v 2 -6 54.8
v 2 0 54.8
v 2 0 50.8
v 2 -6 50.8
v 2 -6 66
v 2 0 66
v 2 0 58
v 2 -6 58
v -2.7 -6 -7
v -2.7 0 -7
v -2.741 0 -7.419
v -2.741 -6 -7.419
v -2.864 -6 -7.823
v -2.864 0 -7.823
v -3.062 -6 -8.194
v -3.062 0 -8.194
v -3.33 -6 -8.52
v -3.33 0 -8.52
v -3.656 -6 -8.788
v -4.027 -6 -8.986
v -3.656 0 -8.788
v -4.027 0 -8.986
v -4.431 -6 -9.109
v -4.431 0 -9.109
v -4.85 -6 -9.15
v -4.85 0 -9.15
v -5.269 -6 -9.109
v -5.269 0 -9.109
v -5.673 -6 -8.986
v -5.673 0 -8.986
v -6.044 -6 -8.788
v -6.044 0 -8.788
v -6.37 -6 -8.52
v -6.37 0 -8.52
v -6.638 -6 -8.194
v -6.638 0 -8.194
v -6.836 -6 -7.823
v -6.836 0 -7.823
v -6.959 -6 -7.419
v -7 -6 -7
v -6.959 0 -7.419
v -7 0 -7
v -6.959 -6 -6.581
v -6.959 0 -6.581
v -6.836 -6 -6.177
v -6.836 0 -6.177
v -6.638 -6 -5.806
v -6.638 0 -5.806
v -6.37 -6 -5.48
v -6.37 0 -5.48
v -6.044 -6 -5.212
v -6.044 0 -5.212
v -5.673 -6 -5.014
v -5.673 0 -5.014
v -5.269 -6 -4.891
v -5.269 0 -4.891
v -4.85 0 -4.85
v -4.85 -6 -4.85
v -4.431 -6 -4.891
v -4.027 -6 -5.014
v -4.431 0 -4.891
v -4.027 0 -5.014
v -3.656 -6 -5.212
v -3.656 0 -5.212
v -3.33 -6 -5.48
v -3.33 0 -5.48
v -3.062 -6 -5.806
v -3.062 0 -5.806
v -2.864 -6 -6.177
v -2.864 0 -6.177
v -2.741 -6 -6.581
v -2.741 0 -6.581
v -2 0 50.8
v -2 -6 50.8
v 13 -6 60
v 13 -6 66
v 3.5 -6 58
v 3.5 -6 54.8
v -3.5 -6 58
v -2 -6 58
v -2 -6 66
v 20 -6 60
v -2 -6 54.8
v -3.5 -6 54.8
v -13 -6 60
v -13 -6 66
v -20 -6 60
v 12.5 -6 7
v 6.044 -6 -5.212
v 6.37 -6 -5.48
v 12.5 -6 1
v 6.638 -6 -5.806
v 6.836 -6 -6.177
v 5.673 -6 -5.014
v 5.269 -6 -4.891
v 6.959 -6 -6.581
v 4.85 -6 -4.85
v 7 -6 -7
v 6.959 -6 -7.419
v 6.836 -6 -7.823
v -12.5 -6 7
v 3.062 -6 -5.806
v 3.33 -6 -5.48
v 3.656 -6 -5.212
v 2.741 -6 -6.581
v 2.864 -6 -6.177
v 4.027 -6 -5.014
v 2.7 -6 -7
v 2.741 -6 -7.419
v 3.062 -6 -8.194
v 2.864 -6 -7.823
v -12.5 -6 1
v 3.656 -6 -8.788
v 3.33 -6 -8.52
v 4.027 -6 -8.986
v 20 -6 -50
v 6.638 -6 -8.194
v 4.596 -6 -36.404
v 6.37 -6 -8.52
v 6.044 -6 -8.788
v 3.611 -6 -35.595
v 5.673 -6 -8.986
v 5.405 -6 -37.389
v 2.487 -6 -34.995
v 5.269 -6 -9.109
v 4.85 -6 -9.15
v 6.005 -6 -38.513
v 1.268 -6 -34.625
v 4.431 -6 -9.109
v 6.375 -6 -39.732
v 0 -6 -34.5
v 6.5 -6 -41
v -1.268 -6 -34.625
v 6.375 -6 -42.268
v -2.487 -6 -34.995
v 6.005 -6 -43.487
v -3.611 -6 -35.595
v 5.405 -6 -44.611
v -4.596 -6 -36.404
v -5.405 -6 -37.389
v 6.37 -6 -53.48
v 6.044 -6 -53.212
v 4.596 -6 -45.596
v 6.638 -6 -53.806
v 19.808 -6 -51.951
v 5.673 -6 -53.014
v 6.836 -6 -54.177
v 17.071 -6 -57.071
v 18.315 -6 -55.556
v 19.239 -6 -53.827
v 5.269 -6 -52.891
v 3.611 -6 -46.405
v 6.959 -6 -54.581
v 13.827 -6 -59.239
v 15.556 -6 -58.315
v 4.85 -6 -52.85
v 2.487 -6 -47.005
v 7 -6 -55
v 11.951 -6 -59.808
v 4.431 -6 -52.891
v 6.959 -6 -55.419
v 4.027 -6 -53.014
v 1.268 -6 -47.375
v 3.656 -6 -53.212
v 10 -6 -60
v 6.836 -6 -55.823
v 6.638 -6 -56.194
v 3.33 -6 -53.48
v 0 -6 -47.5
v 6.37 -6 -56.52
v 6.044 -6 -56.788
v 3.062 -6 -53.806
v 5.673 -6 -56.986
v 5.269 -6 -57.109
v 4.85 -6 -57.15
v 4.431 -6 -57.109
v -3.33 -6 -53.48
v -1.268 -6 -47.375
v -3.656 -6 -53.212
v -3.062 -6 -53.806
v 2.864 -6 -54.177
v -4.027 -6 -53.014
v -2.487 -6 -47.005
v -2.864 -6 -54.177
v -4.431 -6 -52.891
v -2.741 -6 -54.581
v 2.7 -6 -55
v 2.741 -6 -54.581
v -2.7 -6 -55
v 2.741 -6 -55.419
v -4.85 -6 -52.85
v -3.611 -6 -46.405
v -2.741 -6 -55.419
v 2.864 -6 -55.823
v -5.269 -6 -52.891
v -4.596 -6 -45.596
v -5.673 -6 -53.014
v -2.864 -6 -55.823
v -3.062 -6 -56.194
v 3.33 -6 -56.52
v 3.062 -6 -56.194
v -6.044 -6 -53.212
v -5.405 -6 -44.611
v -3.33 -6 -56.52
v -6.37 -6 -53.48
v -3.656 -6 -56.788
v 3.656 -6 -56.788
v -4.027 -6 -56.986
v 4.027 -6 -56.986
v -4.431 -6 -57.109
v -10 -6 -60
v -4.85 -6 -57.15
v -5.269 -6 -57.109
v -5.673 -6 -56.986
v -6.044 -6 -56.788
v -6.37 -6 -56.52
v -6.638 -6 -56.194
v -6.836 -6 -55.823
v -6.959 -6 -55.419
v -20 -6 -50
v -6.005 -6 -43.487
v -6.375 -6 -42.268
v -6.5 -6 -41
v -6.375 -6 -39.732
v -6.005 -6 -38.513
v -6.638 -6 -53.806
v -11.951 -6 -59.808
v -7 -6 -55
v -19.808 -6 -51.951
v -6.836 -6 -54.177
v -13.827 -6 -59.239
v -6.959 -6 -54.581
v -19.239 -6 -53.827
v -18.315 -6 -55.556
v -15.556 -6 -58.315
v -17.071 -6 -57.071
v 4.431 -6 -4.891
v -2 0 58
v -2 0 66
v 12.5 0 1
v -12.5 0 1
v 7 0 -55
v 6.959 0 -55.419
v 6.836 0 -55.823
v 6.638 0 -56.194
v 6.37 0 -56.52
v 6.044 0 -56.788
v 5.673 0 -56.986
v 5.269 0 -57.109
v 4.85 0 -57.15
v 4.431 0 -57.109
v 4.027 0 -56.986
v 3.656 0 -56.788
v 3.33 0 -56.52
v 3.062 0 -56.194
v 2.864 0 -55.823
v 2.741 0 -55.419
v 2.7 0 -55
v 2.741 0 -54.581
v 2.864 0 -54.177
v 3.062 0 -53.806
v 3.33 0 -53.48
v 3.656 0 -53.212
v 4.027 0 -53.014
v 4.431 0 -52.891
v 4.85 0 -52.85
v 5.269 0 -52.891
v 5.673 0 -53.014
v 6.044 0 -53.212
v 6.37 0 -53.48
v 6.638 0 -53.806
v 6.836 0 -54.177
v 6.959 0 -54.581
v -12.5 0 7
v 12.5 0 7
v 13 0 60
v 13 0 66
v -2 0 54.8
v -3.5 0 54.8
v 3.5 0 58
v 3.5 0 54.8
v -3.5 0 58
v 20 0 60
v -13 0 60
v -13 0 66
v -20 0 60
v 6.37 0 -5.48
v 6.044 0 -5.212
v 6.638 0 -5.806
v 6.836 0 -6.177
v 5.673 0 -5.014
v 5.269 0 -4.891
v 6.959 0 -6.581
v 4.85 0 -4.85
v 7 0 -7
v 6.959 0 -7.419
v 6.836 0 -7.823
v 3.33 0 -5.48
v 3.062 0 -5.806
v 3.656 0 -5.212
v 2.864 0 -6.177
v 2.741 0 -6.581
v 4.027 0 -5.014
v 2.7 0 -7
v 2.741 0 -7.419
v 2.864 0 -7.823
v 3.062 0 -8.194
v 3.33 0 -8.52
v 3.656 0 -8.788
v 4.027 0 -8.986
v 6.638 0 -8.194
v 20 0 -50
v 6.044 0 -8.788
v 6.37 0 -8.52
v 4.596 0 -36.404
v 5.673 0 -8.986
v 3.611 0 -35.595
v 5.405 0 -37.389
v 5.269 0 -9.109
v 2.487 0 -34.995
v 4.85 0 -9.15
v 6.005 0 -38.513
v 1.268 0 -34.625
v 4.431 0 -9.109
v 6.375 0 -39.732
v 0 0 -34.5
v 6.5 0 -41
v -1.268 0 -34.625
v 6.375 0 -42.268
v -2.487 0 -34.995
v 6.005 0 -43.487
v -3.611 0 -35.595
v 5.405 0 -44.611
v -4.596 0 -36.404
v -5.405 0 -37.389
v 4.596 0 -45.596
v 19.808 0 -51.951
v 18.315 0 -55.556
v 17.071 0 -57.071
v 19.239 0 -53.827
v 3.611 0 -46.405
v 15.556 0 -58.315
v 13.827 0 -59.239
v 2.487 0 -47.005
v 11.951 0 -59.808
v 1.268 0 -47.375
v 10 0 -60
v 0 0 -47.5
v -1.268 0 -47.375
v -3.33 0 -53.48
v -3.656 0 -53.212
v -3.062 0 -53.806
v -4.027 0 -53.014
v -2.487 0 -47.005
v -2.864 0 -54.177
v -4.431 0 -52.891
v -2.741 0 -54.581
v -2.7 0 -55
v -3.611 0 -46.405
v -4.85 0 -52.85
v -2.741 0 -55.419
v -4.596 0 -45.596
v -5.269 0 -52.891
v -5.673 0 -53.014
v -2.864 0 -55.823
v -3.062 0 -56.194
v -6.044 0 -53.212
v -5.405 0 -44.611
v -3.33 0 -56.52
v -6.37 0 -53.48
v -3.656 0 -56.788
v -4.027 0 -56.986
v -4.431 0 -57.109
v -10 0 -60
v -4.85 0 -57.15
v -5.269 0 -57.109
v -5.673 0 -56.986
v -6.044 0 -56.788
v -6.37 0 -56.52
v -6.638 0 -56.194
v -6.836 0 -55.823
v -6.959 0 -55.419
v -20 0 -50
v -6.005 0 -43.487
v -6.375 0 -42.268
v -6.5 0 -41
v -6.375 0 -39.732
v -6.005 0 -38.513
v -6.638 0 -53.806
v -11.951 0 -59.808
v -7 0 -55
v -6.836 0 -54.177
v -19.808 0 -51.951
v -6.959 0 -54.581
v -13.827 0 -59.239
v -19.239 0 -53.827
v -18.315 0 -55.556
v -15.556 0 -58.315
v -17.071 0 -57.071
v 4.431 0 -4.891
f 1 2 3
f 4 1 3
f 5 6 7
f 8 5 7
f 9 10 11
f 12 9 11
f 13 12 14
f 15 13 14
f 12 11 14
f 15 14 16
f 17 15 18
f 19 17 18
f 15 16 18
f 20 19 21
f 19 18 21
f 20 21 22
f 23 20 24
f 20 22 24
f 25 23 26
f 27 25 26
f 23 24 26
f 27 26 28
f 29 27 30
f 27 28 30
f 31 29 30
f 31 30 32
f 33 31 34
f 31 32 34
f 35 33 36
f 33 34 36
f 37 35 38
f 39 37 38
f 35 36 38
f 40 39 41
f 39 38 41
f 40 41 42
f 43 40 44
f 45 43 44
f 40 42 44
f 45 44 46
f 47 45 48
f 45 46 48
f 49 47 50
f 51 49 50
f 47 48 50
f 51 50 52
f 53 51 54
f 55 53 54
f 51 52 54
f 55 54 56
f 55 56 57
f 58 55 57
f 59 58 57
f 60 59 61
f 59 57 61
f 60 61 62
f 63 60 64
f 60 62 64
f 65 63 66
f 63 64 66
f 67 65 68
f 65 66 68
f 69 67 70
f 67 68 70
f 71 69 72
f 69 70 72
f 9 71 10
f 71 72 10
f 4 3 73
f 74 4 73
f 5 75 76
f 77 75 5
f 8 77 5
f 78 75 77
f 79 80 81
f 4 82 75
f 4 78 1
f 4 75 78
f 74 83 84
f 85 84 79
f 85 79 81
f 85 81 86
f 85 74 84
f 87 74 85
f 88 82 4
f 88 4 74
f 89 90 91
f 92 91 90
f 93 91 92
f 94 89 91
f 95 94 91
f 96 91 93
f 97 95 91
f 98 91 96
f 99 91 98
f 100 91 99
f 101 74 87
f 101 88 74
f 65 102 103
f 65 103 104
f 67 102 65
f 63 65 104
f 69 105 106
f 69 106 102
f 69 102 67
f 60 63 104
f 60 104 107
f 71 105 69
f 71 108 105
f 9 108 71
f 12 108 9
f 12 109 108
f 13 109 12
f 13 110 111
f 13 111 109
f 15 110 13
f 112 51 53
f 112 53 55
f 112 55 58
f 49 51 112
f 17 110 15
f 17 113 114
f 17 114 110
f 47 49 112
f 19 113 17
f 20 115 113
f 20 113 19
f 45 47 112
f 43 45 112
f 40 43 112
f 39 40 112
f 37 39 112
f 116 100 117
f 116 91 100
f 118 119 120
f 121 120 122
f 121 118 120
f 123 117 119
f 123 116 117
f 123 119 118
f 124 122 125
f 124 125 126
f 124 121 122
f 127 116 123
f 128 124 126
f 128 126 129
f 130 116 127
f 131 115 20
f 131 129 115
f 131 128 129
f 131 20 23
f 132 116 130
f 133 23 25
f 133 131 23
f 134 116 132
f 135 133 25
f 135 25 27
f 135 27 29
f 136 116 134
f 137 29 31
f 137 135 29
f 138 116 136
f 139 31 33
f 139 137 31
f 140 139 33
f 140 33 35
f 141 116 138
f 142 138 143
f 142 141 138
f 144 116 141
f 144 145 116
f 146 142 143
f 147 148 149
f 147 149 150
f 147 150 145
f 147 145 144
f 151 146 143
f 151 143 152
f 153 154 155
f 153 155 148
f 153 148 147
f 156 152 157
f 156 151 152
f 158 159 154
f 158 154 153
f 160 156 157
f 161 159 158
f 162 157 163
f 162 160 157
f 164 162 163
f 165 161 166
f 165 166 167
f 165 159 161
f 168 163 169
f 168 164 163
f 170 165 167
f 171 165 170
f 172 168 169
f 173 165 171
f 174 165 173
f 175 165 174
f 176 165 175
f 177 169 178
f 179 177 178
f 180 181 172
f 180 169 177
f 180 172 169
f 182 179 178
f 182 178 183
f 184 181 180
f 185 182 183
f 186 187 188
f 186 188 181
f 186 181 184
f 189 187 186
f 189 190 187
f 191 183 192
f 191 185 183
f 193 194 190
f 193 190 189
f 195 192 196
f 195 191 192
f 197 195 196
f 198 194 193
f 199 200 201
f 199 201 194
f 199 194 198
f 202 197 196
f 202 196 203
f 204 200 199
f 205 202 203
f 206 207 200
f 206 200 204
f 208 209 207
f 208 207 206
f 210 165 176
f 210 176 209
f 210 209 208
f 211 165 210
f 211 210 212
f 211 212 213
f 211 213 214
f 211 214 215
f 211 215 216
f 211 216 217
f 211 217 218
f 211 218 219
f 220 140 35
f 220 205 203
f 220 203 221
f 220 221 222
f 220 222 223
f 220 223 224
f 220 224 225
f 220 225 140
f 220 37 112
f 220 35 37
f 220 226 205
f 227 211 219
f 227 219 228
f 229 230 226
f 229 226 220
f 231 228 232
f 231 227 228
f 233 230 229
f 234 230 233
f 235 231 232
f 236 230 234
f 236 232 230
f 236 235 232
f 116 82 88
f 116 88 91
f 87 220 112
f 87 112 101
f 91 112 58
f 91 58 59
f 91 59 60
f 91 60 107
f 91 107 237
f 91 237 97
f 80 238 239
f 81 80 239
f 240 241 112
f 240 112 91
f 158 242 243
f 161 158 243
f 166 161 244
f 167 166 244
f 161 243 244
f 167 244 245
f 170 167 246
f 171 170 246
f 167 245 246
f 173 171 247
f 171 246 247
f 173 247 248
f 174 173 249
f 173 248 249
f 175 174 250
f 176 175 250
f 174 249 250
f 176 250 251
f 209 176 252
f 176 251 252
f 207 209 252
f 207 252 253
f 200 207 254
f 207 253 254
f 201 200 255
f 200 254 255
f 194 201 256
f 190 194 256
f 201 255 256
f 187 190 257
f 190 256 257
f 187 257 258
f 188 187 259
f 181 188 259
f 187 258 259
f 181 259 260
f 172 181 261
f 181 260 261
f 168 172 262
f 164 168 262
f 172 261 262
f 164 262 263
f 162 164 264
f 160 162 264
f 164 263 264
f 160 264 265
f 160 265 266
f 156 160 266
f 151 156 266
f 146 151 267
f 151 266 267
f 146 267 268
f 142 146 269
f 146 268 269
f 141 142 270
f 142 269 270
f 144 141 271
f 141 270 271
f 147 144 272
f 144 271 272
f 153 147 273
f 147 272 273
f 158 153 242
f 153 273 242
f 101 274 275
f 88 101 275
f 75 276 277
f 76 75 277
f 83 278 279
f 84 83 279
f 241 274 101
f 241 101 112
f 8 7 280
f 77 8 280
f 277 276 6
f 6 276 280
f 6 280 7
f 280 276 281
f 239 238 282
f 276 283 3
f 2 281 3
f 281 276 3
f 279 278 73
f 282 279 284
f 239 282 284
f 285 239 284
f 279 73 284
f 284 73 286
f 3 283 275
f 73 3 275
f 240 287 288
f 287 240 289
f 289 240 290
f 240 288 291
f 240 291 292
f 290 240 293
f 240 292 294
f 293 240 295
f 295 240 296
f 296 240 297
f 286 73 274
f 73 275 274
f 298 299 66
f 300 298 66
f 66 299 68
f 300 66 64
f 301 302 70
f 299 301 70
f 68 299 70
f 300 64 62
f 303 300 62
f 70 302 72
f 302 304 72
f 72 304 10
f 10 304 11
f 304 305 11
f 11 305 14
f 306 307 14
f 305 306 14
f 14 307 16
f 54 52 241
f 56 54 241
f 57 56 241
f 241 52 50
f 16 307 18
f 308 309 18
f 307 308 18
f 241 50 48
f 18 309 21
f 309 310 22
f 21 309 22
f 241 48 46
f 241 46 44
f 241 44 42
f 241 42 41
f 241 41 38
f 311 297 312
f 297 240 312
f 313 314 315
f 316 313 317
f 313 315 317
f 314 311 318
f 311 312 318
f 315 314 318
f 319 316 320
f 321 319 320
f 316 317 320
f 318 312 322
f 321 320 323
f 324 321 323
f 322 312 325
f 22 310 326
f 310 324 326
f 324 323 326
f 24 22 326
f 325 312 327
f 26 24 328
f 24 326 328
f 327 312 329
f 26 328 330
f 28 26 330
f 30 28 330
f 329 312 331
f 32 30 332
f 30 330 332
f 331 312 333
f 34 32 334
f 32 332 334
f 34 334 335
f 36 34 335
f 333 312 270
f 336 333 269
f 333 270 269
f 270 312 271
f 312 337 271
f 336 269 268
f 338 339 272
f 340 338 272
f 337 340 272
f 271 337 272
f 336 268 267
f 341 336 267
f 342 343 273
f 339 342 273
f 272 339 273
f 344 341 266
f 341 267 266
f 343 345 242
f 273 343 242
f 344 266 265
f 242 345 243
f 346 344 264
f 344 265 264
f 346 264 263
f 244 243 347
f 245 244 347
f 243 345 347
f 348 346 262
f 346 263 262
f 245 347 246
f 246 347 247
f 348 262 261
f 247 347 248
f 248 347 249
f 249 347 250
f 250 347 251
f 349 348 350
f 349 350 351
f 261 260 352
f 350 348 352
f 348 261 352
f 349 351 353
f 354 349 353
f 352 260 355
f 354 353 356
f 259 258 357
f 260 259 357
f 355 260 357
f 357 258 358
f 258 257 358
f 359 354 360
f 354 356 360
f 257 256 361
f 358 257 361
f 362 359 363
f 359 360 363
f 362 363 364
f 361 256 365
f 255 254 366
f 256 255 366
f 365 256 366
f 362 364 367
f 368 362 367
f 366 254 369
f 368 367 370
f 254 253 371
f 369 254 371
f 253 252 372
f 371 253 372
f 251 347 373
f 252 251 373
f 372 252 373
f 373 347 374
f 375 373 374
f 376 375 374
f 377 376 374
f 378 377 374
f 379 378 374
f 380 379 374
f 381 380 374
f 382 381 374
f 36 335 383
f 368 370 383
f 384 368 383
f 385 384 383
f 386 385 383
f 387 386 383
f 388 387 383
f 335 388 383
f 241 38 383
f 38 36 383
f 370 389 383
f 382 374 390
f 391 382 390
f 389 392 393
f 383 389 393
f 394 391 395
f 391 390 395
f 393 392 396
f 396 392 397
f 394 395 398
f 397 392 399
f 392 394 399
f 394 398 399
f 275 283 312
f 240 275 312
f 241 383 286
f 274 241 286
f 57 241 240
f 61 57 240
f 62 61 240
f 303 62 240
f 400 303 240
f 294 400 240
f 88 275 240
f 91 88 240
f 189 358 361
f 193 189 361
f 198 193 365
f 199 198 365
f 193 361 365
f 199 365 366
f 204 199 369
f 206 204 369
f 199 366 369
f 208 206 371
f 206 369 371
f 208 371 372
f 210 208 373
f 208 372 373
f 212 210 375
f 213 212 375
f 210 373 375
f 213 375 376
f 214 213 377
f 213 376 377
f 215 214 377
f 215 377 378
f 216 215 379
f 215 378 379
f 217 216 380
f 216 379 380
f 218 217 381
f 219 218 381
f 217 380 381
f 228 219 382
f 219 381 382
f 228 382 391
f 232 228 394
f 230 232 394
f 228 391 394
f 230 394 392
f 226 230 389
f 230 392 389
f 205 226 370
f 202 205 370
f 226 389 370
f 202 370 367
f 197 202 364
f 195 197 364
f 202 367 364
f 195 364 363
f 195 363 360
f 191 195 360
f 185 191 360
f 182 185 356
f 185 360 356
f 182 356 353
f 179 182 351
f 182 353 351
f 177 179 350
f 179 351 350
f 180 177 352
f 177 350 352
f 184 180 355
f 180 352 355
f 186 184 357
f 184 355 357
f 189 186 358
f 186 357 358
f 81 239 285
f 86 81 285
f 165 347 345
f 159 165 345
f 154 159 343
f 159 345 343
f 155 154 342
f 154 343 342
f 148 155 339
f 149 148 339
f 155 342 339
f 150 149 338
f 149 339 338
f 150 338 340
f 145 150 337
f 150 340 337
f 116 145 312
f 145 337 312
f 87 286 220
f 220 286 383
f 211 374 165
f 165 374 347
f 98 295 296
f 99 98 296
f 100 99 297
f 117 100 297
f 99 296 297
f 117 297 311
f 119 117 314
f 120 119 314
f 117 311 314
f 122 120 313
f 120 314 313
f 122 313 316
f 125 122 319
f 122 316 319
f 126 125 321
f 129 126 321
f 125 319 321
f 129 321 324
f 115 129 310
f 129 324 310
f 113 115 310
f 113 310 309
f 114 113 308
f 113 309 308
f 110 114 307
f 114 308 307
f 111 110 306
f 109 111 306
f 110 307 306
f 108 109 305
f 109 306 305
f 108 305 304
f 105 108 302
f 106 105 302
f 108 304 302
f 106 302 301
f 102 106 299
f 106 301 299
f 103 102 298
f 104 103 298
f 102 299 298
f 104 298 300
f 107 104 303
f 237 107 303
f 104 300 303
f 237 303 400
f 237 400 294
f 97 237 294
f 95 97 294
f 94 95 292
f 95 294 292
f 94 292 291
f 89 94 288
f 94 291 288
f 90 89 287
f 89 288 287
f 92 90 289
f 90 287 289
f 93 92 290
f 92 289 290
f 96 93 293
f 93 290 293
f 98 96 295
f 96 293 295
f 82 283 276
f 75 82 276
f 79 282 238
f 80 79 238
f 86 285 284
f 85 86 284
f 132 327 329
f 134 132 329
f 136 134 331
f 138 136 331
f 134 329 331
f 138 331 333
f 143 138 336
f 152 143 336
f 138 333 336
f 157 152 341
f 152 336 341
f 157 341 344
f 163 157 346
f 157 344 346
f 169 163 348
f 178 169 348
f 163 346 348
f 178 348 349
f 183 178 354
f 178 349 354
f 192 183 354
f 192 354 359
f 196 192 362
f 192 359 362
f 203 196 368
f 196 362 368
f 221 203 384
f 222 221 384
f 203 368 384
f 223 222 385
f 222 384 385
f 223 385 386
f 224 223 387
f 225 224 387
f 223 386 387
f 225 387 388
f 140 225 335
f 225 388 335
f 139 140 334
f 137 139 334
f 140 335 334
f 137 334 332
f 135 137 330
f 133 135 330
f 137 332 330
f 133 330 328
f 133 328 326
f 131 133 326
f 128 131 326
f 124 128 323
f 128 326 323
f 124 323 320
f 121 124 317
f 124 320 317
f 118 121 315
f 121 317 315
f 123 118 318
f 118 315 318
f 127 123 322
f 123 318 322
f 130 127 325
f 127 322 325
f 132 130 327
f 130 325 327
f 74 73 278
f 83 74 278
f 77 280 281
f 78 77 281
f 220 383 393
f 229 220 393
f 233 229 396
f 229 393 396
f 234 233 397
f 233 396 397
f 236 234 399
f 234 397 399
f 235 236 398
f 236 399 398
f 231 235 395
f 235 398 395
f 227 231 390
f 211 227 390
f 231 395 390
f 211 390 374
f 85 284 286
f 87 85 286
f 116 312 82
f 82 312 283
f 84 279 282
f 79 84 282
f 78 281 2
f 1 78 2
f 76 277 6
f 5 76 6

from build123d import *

# Parameters (mm, degrees)
SKETCH1_R           = 2.15
SKETCH1_R_2         = 6.5
SKETCH1_W           = 25
SKETCH1_H           = 6
BOSS_EXTRUDE1_DEPTH = 6


with BuildPart() as part:
    # Sketch1 → Boss-Extrude1 (new body)
    with BuildSketch(Plane(origin=(0, 0, 0), x_dir=(1, 0, 0), z_dir=(0, 1, 0))):
        with BuildLine():
            Line((-10, 60), (10, 60))
            ThreePointArc((10, 60), (17.071067812, 57.071067812), (20, 50))
            Line((20, 50), (20, -60))
            Line((20, -60), (13, -60))
            Line((13, -60), (13, -66))
            Line((13, -66), (2, -66))
            Line((2, -66), (2, -58))
            Line((2, -58), (3.5, -58))
            Line((3.5, -58), (3.5, -54.8))
            Line((3.5, -54.8), (2, -54.8))
            Line((2, -54.8), (2, -50.8))
            Line((2, -50.8), (-2, -50.8))
            Line((-2, -50.8), (-2, -54.8))
            Line((-2, -54.8), (-3.5, -54.8))
            Line((-3.5, -54.8), (-3.5, -58))
            Line((-3.5, -58), (-2, -58))
            Line((-2, -58), (-2, -66))
            Line((-2, -66), (-13, -66))
            Line((-13, -66), (-13, -60))
            Line((-13, -60), (-20, -60))
            Line((-20, -60), (-20, 50))
            ThreePointArc((-20, 50), (-17.071067812, 57.071067812), (-10, 60))
        make_face()
        with Locations((4.85, 55)):
            Circle(SKETCH1_R, mode=Mode.SUBTRACT)
        with Locations((0, 41)):
            Circle(SKETCH1_R_2, mode=Mode.SUBTRACT)
        with Locations((4.85, 7)):
            Circle(SKETCH1_R, mode=Mode.SUBTRACT)
        with Locations((-4.85, 55)):
            Circle(SKETCH1_R, mode=Mode.SUBTRACT)
        with Locations((-4.85, 7)):
            Circle(SKETCH1_R, mode=Mode.SUBTRACT)
        with Locations((0, -4)):
            Rectangle(SKETCH1_W, SKETCH1_H, mode=Mode.SUBTRACT)
    extrude(amount=-BOSS_EXTRUDE1_DEPTH)


solid = part.part
